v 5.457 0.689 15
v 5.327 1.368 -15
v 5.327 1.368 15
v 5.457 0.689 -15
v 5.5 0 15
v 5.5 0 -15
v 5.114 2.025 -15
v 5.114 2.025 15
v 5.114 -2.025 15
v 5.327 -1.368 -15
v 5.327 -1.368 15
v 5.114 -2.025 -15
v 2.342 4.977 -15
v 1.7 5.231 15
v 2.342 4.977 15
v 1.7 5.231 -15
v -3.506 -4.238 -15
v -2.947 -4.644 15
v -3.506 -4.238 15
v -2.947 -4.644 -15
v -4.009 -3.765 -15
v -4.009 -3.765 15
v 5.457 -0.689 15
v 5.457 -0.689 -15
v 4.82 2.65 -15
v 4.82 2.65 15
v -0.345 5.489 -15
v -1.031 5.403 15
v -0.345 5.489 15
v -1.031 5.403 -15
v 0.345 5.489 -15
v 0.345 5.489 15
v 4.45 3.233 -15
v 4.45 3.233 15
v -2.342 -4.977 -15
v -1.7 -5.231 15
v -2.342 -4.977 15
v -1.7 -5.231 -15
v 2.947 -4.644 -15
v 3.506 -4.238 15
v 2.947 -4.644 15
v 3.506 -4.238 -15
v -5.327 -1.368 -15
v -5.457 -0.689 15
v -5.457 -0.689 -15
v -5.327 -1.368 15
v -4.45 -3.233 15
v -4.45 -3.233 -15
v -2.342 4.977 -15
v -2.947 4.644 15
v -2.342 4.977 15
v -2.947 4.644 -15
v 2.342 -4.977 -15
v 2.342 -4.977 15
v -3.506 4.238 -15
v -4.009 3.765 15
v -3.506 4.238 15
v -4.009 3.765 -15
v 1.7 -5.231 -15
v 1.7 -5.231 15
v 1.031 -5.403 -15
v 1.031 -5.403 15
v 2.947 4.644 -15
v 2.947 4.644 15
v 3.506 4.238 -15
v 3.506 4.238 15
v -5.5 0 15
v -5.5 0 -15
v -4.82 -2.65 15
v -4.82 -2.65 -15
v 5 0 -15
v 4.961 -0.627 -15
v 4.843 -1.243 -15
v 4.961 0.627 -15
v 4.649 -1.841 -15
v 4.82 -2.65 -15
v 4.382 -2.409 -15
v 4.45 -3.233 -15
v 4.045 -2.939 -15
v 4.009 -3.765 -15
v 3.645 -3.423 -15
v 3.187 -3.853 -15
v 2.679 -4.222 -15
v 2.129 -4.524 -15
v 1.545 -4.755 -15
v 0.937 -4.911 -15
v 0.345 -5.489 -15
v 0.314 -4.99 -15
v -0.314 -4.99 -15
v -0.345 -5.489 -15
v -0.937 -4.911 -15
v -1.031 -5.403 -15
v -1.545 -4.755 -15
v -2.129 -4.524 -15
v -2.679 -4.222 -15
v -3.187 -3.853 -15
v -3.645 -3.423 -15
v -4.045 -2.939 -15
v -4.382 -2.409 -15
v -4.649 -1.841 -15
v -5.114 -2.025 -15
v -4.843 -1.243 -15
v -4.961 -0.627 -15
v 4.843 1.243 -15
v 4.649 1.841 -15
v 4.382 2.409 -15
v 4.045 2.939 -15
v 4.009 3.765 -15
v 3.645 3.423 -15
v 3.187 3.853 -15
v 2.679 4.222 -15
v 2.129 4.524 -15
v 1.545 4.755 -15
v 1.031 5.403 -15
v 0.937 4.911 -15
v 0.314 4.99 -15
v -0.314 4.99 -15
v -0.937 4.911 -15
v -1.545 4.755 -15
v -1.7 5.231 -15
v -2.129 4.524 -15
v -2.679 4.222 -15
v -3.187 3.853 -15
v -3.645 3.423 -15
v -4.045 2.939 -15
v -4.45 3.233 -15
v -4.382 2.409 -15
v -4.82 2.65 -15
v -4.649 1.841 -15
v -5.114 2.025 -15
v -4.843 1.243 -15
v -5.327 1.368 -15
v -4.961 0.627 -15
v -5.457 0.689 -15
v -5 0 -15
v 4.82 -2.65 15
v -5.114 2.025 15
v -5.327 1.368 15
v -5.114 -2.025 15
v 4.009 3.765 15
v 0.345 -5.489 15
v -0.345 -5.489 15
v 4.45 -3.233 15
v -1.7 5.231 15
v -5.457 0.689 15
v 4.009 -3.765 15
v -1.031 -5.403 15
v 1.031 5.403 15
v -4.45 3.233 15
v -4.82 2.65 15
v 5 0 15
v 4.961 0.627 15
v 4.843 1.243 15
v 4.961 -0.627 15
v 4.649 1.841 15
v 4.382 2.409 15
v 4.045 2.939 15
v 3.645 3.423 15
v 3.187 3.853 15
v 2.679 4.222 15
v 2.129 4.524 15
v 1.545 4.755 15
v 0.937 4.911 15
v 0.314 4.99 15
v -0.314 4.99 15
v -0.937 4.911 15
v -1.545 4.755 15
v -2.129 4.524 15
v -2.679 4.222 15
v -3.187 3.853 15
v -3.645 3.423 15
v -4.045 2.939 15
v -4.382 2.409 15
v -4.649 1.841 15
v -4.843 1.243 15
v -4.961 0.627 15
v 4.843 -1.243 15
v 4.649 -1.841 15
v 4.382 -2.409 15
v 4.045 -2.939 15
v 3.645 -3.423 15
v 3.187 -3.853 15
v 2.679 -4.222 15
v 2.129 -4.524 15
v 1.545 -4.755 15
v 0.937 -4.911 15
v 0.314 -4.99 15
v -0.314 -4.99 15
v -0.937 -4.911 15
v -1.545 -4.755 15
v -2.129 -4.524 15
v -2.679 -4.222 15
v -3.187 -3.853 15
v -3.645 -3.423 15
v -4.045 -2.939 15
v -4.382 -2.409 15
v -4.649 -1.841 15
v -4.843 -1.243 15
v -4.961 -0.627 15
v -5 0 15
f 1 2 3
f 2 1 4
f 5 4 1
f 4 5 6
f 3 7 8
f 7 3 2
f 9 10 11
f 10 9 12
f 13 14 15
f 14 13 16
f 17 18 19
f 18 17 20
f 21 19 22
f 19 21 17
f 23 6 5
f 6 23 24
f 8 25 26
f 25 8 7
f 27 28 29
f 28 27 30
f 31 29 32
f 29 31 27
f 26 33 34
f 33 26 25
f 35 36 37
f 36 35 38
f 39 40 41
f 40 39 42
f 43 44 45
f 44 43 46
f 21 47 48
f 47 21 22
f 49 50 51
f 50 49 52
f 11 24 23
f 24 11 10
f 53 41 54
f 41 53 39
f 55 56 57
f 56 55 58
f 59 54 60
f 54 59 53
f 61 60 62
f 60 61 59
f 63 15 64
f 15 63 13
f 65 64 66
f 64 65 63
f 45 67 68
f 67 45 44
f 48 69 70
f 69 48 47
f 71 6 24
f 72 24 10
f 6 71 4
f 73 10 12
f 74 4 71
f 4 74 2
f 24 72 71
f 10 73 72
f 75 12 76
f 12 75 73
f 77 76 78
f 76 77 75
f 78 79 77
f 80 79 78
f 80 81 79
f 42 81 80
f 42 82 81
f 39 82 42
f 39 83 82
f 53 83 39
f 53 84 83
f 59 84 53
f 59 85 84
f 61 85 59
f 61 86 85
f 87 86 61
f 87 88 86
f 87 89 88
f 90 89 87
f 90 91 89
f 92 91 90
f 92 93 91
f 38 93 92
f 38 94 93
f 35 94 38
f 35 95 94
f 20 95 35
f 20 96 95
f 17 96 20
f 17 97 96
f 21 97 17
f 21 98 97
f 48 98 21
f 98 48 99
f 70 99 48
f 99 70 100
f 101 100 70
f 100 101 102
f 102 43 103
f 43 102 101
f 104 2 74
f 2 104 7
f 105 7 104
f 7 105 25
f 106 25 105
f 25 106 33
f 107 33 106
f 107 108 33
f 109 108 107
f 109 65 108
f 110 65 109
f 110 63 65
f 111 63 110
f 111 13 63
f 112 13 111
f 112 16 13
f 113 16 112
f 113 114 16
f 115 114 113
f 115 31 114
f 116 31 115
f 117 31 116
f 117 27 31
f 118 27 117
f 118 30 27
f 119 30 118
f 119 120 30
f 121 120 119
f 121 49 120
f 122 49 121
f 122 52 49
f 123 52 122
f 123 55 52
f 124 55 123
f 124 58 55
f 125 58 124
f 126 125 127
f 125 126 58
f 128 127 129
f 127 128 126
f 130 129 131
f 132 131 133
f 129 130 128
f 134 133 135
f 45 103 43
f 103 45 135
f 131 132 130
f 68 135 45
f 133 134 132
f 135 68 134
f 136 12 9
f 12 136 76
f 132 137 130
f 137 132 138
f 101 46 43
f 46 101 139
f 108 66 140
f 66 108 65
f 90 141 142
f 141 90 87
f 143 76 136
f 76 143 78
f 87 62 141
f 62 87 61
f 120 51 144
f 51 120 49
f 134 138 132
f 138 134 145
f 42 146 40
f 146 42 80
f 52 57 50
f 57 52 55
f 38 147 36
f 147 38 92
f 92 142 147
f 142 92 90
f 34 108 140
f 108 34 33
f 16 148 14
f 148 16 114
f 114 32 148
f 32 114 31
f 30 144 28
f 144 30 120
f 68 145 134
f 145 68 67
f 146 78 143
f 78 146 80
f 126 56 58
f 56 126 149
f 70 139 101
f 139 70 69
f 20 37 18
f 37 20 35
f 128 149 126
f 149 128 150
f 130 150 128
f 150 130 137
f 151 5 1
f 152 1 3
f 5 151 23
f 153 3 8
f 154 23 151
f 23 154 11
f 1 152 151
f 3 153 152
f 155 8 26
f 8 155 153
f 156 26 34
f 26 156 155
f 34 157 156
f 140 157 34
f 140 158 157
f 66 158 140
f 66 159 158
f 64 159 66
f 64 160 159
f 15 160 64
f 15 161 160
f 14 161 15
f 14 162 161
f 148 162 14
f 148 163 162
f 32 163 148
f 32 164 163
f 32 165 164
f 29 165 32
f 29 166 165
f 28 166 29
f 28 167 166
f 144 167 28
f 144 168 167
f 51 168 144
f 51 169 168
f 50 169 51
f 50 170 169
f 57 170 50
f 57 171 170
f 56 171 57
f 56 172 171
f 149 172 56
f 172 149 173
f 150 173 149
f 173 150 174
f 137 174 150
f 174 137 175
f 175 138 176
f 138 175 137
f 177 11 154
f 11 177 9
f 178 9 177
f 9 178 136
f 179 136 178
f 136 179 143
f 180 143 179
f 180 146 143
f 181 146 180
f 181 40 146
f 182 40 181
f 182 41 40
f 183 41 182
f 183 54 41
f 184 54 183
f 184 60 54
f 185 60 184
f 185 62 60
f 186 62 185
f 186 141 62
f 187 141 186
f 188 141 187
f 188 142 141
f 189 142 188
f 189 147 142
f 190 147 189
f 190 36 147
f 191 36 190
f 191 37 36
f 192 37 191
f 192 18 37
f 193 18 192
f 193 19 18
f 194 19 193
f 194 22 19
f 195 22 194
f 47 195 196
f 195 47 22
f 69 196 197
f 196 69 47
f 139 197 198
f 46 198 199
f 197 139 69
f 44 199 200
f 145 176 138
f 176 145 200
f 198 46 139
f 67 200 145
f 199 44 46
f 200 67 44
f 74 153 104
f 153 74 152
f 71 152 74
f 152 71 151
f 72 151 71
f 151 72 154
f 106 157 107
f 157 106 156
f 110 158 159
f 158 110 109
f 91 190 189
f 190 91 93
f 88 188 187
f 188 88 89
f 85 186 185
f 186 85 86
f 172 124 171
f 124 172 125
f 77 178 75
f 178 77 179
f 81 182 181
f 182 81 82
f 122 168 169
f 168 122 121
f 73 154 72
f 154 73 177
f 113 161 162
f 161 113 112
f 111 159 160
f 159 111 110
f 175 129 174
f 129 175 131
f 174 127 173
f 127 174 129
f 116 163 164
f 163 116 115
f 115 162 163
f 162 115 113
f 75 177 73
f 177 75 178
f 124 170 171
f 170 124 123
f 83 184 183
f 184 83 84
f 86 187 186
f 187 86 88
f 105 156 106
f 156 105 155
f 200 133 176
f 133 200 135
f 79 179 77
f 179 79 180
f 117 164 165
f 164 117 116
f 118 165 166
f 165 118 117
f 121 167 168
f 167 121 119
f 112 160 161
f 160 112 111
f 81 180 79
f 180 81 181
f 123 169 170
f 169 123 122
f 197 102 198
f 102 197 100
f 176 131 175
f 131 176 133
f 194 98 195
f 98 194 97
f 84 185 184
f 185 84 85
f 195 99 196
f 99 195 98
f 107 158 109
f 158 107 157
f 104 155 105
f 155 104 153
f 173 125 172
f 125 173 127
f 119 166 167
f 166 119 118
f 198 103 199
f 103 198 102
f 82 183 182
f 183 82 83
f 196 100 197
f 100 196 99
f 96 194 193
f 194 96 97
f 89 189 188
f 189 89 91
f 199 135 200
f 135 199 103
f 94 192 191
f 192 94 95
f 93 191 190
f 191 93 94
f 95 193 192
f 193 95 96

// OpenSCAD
$fn = 50;


difference() {
	union() {
		translate(v = [0, 0, -15.0000000000]) {
			cylinder(h = 30, r = 5.5000000000);
		}
	}
	union() {
		translate(v = [0, 0, -100.0000000000]) {
			cylinder(h = 200, r = 5.0000000000);
		}
	}
}
